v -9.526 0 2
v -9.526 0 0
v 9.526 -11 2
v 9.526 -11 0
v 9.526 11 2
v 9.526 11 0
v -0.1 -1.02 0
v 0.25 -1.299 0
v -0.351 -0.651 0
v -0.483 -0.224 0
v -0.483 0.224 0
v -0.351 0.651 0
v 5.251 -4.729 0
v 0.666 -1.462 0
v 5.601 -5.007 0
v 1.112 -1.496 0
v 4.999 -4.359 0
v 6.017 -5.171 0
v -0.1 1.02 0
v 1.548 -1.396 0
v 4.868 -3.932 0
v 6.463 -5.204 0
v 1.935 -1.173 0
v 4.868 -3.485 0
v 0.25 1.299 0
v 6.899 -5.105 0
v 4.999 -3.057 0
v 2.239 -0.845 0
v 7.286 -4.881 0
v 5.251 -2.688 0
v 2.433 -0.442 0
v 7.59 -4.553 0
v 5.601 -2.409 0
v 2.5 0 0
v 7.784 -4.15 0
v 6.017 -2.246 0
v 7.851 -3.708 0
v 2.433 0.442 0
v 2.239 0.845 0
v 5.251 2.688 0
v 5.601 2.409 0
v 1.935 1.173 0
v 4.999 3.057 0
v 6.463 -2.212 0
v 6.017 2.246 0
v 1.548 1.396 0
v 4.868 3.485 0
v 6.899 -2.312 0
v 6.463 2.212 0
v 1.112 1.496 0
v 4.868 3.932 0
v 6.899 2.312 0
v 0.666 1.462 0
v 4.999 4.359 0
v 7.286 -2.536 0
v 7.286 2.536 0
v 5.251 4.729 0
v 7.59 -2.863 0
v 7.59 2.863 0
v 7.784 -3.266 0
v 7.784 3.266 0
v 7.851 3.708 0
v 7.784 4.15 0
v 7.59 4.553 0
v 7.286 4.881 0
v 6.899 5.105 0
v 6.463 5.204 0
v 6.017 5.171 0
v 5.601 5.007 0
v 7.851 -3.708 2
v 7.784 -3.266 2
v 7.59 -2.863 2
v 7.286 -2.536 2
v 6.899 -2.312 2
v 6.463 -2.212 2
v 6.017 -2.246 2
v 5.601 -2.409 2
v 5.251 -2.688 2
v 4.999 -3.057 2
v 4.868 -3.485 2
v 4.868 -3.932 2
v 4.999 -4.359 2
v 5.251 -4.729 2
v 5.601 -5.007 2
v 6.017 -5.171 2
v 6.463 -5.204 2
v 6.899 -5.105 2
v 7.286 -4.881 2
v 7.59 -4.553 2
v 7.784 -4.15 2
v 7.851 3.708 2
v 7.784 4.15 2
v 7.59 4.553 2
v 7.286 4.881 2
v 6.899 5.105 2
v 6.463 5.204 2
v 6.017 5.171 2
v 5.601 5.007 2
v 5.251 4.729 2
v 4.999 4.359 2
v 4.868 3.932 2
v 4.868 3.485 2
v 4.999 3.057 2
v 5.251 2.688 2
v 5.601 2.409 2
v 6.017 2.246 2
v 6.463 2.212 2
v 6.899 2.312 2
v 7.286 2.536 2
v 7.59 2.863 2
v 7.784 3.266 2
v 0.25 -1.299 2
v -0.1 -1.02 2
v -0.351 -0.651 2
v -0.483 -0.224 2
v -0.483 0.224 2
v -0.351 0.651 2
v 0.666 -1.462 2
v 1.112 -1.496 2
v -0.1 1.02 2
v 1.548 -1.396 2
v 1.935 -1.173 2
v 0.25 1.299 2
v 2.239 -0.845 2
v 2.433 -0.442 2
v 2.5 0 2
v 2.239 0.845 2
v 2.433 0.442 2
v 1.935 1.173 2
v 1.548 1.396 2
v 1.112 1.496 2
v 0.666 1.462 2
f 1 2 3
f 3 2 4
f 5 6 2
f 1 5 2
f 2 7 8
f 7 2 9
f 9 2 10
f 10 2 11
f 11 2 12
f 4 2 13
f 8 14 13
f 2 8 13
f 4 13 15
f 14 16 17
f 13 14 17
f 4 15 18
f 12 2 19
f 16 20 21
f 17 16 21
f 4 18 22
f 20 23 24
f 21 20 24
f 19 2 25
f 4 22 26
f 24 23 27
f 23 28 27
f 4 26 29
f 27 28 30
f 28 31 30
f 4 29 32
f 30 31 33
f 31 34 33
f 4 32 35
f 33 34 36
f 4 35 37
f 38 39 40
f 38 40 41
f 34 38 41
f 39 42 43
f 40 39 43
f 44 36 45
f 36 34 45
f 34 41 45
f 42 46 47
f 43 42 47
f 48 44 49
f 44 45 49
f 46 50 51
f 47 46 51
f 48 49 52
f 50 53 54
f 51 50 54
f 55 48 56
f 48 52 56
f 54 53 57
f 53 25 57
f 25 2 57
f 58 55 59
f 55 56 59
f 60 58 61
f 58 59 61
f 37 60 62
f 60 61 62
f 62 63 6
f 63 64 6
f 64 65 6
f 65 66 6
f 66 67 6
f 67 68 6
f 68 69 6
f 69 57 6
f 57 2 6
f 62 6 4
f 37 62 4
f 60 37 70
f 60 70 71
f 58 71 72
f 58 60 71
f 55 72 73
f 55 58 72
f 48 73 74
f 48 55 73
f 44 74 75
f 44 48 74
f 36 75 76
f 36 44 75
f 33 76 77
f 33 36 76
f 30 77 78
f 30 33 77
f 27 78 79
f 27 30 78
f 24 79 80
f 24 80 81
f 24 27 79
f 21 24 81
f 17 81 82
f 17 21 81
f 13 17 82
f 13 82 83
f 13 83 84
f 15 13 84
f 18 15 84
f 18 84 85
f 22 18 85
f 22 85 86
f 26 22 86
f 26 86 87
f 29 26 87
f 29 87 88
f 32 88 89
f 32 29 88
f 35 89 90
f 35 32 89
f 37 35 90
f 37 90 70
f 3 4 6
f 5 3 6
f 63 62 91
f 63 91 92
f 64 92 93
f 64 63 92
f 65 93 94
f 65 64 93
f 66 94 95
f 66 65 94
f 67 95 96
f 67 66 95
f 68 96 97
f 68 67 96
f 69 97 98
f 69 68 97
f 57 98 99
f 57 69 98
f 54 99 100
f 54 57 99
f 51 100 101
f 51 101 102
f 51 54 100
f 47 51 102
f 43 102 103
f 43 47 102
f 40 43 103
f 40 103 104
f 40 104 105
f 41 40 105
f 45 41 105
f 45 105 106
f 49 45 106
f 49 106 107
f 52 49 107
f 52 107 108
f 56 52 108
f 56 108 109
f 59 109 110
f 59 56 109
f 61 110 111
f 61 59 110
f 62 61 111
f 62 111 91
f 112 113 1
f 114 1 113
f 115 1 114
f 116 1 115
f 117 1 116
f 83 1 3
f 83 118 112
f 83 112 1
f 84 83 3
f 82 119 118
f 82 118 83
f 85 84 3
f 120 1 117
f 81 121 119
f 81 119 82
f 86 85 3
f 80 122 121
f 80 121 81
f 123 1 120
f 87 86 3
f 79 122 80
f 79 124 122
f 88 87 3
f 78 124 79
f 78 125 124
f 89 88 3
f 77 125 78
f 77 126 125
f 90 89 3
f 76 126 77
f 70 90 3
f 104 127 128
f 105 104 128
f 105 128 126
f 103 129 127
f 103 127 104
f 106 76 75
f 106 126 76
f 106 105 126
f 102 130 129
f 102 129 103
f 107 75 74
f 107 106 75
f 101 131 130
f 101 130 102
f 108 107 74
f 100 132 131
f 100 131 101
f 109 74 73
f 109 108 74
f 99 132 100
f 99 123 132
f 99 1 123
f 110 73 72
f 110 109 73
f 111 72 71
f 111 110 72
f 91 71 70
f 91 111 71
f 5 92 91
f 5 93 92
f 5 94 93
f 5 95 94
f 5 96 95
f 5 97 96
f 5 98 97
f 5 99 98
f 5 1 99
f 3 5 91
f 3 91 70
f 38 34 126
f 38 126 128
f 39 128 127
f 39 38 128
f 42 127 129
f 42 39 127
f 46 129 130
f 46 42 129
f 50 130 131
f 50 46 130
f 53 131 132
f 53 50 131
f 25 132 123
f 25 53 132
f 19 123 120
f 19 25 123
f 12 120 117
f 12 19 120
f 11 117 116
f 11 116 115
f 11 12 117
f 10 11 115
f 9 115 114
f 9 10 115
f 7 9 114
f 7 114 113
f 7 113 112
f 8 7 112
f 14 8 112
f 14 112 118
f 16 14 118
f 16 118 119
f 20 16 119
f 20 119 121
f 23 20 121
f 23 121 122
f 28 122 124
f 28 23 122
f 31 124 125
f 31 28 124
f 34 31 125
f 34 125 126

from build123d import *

# Parameters (mm, degrees)
F0_R     = 1.5
F1_DEPTH = 2


with BuildPart() as f1:
    # F0 (on Top) → F1 (new body)
    with BuildSketch(Plane.XY):
        Polygon((9.526279, 11), (-9.526279, 0), (9.526279, -11), (9.526279, -10), (9.526279, 10), align=None)
        with Locations((6.350847, -3.708273)):
            Circle(F0_R, mode=Mode.SUBTRACT)
        with Locations((1, 0)):
            Circle(F0_R, mode=Mode.SUBTRACT)
        with Locations((6.350847, 3.708273)):
            Circle(F0_R, mode=Mode.SUBTRACT)
    extrude(amount=F1_DEPTH)


solid = f1.part
